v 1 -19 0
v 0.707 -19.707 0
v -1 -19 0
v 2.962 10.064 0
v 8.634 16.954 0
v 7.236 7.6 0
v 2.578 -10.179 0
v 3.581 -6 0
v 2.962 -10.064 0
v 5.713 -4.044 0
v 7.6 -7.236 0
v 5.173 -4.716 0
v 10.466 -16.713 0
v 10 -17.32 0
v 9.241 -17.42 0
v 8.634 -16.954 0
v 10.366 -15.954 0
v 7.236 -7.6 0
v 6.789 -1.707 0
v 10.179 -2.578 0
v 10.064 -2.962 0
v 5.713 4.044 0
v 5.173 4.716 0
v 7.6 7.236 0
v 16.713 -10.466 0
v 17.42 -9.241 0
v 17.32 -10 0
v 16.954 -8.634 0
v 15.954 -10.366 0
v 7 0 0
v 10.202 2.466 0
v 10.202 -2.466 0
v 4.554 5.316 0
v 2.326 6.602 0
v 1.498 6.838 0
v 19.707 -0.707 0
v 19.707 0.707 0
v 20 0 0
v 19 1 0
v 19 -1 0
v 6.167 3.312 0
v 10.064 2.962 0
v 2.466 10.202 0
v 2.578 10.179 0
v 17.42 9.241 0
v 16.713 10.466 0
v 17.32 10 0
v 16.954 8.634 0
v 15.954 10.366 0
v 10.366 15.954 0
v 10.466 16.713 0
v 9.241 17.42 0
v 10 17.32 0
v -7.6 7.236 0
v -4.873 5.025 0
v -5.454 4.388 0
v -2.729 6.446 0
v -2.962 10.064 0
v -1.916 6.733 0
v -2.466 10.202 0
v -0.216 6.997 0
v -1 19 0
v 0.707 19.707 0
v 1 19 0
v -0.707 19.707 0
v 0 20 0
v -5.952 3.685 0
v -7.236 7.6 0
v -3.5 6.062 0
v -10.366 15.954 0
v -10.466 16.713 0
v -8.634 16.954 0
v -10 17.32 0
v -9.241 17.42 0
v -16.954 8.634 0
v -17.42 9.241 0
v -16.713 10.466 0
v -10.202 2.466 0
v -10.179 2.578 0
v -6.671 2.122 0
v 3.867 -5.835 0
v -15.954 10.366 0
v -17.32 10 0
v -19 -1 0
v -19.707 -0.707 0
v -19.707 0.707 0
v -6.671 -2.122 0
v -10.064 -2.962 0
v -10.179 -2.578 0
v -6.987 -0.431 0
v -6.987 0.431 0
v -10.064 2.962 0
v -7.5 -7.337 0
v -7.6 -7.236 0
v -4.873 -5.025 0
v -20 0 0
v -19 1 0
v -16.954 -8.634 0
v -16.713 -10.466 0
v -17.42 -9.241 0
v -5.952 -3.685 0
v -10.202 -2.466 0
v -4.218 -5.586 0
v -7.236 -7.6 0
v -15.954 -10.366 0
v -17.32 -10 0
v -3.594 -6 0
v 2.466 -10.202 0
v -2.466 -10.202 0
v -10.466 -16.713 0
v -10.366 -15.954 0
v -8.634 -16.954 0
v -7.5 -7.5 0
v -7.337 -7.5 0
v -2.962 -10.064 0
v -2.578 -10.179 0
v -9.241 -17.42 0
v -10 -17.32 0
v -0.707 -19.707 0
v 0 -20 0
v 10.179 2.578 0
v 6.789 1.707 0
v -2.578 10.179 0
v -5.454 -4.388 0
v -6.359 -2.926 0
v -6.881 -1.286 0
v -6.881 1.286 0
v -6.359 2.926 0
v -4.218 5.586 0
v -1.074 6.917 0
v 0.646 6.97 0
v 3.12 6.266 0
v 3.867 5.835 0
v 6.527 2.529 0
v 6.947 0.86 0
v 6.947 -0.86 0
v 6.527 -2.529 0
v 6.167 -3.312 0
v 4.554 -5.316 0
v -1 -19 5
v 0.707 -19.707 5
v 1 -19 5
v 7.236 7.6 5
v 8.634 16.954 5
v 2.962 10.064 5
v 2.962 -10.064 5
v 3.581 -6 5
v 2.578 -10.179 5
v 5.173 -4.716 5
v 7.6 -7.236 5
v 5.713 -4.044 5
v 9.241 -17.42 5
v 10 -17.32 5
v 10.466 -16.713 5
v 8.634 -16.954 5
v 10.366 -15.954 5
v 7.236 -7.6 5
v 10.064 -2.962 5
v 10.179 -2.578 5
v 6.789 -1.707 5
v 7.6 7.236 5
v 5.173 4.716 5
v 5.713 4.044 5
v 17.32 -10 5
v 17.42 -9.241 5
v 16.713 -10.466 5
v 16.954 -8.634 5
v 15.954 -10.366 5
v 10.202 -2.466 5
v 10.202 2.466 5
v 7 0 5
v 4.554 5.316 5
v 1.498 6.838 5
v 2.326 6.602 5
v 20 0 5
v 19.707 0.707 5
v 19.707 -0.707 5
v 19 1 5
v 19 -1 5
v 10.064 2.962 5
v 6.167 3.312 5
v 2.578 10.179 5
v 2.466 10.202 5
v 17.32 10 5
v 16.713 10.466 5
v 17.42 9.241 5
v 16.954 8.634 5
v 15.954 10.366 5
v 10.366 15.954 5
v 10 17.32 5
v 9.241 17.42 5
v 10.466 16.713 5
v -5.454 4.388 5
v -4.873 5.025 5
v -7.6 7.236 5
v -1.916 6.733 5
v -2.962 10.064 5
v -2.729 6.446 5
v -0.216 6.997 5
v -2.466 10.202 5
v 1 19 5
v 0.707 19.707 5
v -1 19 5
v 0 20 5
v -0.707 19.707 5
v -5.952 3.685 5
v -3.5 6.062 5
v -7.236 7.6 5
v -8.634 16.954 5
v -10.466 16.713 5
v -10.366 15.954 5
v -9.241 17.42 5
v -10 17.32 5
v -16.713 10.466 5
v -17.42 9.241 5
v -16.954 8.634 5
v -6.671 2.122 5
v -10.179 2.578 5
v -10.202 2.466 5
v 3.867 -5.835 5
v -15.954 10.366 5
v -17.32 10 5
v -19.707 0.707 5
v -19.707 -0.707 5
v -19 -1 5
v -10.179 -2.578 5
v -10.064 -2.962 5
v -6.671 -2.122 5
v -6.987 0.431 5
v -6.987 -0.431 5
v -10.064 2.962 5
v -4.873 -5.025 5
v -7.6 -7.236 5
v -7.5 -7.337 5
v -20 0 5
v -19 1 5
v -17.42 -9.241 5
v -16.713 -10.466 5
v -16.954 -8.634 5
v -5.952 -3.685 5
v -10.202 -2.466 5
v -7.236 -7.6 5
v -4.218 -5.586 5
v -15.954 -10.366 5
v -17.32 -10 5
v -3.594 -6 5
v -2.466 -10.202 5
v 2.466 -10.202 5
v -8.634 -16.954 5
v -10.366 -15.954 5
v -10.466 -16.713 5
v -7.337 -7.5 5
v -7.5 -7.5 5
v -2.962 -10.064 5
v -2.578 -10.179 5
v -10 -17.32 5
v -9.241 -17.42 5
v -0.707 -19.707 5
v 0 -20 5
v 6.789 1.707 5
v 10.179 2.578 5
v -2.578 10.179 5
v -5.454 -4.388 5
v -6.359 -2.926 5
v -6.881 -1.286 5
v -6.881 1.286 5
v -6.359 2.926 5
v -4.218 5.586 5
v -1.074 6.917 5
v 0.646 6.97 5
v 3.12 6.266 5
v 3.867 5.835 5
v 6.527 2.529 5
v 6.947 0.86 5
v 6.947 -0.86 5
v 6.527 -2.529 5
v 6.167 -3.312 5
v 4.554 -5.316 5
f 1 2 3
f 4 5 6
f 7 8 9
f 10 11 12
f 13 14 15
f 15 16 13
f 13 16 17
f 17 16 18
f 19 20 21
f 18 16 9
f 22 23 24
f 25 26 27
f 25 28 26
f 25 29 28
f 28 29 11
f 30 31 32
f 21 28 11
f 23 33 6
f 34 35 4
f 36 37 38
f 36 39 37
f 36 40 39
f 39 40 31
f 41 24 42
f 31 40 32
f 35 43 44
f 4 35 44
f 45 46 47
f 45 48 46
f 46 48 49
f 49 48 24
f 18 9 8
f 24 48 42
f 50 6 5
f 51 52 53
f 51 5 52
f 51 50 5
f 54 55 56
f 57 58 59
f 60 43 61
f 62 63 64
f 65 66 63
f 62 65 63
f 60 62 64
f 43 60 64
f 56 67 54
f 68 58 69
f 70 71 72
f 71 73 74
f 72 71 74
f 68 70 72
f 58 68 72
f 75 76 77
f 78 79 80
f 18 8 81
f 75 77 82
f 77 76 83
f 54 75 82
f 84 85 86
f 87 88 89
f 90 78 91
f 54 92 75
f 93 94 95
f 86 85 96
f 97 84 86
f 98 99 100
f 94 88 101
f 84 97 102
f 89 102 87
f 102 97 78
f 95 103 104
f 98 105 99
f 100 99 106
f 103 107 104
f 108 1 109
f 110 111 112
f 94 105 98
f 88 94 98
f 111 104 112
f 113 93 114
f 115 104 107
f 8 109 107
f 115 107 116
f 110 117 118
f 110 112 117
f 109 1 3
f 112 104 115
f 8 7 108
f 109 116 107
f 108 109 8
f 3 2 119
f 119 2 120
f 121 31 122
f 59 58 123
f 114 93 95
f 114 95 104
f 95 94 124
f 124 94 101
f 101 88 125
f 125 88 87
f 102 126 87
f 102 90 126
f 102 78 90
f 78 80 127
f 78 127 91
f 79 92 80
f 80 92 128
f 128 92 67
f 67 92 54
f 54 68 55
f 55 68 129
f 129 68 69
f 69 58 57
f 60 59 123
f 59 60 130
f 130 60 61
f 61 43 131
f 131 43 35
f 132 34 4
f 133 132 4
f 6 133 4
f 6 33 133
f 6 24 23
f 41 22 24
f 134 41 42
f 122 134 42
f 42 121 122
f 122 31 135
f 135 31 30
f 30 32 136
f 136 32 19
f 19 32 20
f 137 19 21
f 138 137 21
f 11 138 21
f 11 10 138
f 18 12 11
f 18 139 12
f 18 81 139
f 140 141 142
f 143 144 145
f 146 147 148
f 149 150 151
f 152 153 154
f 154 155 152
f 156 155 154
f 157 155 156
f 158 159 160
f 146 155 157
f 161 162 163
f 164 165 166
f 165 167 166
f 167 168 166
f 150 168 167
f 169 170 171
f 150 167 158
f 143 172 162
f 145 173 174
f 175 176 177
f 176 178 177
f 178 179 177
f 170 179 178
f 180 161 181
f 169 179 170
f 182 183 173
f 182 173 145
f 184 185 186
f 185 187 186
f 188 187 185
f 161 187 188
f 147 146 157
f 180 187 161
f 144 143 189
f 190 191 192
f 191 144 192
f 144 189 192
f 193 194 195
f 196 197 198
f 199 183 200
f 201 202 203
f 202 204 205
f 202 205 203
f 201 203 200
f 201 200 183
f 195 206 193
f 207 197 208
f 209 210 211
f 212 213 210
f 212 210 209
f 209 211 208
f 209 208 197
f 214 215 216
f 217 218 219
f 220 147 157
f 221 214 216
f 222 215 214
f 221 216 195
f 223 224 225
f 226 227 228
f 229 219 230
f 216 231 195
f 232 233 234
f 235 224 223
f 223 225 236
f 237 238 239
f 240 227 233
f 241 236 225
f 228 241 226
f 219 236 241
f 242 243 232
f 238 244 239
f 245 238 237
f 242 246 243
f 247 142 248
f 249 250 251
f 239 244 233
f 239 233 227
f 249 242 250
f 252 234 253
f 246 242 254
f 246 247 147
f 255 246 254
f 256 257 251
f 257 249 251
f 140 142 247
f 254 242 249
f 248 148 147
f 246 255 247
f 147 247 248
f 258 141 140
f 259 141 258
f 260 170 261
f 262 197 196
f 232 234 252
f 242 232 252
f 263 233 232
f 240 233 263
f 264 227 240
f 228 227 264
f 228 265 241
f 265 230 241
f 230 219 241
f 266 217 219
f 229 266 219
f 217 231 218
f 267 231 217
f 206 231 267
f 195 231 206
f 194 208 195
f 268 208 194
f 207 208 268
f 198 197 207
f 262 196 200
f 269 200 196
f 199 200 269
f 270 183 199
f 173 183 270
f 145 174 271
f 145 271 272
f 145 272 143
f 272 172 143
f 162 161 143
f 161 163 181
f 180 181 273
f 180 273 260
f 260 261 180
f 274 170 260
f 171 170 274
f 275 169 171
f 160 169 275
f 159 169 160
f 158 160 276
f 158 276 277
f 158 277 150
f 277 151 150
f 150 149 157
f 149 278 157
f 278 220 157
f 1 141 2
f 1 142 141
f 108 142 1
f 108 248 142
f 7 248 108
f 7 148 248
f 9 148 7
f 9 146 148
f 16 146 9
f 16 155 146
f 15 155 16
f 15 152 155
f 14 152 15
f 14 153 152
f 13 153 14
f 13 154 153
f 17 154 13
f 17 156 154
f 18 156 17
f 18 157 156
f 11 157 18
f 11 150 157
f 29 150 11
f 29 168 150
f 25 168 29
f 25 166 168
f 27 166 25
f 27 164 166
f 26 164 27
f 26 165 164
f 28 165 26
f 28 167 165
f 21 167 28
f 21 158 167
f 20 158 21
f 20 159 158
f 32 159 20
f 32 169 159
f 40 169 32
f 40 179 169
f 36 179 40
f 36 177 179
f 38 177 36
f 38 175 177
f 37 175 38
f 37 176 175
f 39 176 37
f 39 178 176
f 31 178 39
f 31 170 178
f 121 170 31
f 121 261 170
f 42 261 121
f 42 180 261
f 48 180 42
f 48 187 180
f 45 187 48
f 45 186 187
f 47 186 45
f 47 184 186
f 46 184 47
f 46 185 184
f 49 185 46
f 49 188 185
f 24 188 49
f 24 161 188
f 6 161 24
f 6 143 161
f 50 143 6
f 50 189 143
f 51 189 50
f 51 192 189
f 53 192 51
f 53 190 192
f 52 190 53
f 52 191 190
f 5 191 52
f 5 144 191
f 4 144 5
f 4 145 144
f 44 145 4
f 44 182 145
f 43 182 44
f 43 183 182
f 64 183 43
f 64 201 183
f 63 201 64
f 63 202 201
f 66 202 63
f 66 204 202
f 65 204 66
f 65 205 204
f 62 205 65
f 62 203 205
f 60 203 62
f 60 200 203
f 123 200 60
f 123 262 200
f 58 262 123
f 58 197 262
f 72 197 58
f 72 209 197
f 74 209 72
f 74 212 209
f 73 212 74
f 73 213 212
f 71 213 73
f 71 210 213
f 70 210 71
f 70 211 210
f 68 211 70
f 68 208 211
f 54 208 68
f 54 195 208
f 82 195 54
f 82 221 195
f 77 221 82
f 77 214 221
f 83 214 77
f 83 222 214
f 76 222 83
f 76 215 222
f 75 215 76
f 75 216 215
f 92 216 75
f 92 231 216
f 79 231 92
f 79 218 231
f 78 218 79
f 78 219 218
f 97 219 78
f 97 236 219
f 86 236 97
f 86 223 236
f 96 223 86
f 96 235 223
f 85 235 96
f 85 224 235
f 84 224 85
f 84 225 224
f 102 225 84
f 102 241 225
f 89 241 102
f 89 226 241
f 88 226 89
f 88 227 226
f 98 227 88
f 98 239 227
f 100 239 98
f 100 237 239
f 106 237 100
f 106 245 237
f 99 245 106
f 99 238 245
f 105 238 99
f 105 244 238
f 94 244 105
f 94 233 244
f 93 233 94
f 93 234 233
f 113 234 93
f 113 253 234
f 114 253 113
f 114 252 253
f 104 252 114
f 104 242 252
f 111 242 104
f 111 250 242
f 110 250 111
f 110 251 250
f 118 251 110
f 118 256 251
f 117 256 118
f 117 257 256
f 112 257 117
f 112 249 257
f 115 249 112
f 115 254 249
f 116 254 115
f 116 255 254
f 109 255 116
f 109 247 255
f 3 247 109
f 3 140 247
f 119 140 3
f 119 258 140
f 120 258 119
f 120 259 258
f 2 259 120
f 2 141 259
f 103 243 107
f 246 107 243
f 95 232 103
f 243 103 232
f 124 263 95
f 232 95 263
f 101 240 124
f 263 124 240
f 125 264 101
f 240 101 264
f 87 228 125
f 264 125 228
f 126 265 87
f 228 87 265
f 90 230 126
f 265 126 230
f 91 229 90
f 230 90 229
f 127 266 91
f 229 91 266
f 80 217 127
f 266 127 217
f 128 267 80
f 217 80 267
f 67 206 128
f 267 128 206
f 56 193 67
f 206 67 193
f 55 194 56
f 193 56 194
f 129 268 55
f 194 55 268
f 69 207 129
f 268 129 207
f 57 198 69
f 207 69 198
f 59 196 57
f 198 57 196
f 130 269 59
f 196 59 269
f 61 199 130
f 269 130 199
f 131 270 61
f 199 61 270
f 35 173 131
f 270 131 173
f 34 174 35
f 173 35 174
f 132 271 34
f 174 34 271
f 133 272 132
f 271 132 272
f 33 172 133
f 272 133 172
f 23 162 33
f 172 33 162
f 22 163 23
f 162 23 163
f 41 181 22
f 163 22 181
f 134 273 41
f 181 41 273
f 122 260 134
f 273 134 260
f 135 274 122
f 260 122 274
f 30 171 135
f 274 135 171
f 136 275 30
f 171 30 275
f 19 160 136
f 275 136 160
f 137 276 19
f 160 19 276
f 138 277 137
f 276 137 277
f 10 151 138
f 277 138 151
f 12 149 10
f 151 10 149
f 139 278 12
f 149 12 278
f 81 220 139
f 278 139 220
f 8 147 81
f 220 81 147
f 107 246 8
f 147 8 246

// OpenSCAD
$fa = 1;
$fs = 1.75 / 2;

thickness = 5;
teeth_outer_diameter = 30;
teeth_inner_diameter = 20;
tooth_count = 12;
tooth_point_radius = 1;
tooth_width = 3;
shaft_diameter = 14;
notched_diameter = 12.5;
shaft_tollerance = 1;

teeth_outer_radius = teeth_outer_diameter / 2;
teeth_inner_radius = teeth_inner_diameter / 2;
tooth_length = teeth_outer_diameter - teeth_inner_diameter;

shaft_radius = (shaft_diameter / 2) + (shaft_tollerance / 2);

linear_extrude(5) {
    difference() {
        circle(r = teeth_inner_radius + tooth_point_radius / 2);
        circle(r = shaft_diameter / 2);
    }

    translate([-shaft_radius, -shaft_radius, 0])
    square([shaft_diameter, shaft_diameter - notched_diameter]);

    for (i = [0:tooth_count]) {
        rotate(i * (360 / tooth_count))
        translate([0, teeth_inner_radius, 0])
        hull() {
            translate([0, tooth_length - tooth_point_radius, 0])
            circle(r = tooth_point_radius);

            translate([-tooth_width / 2, 0, 0])
            circle(r = tooth_point_radius);

            translate([tooth_width / 2, 0, 0])
            circle(r = tooth_point_radius);
        }
    }
}
